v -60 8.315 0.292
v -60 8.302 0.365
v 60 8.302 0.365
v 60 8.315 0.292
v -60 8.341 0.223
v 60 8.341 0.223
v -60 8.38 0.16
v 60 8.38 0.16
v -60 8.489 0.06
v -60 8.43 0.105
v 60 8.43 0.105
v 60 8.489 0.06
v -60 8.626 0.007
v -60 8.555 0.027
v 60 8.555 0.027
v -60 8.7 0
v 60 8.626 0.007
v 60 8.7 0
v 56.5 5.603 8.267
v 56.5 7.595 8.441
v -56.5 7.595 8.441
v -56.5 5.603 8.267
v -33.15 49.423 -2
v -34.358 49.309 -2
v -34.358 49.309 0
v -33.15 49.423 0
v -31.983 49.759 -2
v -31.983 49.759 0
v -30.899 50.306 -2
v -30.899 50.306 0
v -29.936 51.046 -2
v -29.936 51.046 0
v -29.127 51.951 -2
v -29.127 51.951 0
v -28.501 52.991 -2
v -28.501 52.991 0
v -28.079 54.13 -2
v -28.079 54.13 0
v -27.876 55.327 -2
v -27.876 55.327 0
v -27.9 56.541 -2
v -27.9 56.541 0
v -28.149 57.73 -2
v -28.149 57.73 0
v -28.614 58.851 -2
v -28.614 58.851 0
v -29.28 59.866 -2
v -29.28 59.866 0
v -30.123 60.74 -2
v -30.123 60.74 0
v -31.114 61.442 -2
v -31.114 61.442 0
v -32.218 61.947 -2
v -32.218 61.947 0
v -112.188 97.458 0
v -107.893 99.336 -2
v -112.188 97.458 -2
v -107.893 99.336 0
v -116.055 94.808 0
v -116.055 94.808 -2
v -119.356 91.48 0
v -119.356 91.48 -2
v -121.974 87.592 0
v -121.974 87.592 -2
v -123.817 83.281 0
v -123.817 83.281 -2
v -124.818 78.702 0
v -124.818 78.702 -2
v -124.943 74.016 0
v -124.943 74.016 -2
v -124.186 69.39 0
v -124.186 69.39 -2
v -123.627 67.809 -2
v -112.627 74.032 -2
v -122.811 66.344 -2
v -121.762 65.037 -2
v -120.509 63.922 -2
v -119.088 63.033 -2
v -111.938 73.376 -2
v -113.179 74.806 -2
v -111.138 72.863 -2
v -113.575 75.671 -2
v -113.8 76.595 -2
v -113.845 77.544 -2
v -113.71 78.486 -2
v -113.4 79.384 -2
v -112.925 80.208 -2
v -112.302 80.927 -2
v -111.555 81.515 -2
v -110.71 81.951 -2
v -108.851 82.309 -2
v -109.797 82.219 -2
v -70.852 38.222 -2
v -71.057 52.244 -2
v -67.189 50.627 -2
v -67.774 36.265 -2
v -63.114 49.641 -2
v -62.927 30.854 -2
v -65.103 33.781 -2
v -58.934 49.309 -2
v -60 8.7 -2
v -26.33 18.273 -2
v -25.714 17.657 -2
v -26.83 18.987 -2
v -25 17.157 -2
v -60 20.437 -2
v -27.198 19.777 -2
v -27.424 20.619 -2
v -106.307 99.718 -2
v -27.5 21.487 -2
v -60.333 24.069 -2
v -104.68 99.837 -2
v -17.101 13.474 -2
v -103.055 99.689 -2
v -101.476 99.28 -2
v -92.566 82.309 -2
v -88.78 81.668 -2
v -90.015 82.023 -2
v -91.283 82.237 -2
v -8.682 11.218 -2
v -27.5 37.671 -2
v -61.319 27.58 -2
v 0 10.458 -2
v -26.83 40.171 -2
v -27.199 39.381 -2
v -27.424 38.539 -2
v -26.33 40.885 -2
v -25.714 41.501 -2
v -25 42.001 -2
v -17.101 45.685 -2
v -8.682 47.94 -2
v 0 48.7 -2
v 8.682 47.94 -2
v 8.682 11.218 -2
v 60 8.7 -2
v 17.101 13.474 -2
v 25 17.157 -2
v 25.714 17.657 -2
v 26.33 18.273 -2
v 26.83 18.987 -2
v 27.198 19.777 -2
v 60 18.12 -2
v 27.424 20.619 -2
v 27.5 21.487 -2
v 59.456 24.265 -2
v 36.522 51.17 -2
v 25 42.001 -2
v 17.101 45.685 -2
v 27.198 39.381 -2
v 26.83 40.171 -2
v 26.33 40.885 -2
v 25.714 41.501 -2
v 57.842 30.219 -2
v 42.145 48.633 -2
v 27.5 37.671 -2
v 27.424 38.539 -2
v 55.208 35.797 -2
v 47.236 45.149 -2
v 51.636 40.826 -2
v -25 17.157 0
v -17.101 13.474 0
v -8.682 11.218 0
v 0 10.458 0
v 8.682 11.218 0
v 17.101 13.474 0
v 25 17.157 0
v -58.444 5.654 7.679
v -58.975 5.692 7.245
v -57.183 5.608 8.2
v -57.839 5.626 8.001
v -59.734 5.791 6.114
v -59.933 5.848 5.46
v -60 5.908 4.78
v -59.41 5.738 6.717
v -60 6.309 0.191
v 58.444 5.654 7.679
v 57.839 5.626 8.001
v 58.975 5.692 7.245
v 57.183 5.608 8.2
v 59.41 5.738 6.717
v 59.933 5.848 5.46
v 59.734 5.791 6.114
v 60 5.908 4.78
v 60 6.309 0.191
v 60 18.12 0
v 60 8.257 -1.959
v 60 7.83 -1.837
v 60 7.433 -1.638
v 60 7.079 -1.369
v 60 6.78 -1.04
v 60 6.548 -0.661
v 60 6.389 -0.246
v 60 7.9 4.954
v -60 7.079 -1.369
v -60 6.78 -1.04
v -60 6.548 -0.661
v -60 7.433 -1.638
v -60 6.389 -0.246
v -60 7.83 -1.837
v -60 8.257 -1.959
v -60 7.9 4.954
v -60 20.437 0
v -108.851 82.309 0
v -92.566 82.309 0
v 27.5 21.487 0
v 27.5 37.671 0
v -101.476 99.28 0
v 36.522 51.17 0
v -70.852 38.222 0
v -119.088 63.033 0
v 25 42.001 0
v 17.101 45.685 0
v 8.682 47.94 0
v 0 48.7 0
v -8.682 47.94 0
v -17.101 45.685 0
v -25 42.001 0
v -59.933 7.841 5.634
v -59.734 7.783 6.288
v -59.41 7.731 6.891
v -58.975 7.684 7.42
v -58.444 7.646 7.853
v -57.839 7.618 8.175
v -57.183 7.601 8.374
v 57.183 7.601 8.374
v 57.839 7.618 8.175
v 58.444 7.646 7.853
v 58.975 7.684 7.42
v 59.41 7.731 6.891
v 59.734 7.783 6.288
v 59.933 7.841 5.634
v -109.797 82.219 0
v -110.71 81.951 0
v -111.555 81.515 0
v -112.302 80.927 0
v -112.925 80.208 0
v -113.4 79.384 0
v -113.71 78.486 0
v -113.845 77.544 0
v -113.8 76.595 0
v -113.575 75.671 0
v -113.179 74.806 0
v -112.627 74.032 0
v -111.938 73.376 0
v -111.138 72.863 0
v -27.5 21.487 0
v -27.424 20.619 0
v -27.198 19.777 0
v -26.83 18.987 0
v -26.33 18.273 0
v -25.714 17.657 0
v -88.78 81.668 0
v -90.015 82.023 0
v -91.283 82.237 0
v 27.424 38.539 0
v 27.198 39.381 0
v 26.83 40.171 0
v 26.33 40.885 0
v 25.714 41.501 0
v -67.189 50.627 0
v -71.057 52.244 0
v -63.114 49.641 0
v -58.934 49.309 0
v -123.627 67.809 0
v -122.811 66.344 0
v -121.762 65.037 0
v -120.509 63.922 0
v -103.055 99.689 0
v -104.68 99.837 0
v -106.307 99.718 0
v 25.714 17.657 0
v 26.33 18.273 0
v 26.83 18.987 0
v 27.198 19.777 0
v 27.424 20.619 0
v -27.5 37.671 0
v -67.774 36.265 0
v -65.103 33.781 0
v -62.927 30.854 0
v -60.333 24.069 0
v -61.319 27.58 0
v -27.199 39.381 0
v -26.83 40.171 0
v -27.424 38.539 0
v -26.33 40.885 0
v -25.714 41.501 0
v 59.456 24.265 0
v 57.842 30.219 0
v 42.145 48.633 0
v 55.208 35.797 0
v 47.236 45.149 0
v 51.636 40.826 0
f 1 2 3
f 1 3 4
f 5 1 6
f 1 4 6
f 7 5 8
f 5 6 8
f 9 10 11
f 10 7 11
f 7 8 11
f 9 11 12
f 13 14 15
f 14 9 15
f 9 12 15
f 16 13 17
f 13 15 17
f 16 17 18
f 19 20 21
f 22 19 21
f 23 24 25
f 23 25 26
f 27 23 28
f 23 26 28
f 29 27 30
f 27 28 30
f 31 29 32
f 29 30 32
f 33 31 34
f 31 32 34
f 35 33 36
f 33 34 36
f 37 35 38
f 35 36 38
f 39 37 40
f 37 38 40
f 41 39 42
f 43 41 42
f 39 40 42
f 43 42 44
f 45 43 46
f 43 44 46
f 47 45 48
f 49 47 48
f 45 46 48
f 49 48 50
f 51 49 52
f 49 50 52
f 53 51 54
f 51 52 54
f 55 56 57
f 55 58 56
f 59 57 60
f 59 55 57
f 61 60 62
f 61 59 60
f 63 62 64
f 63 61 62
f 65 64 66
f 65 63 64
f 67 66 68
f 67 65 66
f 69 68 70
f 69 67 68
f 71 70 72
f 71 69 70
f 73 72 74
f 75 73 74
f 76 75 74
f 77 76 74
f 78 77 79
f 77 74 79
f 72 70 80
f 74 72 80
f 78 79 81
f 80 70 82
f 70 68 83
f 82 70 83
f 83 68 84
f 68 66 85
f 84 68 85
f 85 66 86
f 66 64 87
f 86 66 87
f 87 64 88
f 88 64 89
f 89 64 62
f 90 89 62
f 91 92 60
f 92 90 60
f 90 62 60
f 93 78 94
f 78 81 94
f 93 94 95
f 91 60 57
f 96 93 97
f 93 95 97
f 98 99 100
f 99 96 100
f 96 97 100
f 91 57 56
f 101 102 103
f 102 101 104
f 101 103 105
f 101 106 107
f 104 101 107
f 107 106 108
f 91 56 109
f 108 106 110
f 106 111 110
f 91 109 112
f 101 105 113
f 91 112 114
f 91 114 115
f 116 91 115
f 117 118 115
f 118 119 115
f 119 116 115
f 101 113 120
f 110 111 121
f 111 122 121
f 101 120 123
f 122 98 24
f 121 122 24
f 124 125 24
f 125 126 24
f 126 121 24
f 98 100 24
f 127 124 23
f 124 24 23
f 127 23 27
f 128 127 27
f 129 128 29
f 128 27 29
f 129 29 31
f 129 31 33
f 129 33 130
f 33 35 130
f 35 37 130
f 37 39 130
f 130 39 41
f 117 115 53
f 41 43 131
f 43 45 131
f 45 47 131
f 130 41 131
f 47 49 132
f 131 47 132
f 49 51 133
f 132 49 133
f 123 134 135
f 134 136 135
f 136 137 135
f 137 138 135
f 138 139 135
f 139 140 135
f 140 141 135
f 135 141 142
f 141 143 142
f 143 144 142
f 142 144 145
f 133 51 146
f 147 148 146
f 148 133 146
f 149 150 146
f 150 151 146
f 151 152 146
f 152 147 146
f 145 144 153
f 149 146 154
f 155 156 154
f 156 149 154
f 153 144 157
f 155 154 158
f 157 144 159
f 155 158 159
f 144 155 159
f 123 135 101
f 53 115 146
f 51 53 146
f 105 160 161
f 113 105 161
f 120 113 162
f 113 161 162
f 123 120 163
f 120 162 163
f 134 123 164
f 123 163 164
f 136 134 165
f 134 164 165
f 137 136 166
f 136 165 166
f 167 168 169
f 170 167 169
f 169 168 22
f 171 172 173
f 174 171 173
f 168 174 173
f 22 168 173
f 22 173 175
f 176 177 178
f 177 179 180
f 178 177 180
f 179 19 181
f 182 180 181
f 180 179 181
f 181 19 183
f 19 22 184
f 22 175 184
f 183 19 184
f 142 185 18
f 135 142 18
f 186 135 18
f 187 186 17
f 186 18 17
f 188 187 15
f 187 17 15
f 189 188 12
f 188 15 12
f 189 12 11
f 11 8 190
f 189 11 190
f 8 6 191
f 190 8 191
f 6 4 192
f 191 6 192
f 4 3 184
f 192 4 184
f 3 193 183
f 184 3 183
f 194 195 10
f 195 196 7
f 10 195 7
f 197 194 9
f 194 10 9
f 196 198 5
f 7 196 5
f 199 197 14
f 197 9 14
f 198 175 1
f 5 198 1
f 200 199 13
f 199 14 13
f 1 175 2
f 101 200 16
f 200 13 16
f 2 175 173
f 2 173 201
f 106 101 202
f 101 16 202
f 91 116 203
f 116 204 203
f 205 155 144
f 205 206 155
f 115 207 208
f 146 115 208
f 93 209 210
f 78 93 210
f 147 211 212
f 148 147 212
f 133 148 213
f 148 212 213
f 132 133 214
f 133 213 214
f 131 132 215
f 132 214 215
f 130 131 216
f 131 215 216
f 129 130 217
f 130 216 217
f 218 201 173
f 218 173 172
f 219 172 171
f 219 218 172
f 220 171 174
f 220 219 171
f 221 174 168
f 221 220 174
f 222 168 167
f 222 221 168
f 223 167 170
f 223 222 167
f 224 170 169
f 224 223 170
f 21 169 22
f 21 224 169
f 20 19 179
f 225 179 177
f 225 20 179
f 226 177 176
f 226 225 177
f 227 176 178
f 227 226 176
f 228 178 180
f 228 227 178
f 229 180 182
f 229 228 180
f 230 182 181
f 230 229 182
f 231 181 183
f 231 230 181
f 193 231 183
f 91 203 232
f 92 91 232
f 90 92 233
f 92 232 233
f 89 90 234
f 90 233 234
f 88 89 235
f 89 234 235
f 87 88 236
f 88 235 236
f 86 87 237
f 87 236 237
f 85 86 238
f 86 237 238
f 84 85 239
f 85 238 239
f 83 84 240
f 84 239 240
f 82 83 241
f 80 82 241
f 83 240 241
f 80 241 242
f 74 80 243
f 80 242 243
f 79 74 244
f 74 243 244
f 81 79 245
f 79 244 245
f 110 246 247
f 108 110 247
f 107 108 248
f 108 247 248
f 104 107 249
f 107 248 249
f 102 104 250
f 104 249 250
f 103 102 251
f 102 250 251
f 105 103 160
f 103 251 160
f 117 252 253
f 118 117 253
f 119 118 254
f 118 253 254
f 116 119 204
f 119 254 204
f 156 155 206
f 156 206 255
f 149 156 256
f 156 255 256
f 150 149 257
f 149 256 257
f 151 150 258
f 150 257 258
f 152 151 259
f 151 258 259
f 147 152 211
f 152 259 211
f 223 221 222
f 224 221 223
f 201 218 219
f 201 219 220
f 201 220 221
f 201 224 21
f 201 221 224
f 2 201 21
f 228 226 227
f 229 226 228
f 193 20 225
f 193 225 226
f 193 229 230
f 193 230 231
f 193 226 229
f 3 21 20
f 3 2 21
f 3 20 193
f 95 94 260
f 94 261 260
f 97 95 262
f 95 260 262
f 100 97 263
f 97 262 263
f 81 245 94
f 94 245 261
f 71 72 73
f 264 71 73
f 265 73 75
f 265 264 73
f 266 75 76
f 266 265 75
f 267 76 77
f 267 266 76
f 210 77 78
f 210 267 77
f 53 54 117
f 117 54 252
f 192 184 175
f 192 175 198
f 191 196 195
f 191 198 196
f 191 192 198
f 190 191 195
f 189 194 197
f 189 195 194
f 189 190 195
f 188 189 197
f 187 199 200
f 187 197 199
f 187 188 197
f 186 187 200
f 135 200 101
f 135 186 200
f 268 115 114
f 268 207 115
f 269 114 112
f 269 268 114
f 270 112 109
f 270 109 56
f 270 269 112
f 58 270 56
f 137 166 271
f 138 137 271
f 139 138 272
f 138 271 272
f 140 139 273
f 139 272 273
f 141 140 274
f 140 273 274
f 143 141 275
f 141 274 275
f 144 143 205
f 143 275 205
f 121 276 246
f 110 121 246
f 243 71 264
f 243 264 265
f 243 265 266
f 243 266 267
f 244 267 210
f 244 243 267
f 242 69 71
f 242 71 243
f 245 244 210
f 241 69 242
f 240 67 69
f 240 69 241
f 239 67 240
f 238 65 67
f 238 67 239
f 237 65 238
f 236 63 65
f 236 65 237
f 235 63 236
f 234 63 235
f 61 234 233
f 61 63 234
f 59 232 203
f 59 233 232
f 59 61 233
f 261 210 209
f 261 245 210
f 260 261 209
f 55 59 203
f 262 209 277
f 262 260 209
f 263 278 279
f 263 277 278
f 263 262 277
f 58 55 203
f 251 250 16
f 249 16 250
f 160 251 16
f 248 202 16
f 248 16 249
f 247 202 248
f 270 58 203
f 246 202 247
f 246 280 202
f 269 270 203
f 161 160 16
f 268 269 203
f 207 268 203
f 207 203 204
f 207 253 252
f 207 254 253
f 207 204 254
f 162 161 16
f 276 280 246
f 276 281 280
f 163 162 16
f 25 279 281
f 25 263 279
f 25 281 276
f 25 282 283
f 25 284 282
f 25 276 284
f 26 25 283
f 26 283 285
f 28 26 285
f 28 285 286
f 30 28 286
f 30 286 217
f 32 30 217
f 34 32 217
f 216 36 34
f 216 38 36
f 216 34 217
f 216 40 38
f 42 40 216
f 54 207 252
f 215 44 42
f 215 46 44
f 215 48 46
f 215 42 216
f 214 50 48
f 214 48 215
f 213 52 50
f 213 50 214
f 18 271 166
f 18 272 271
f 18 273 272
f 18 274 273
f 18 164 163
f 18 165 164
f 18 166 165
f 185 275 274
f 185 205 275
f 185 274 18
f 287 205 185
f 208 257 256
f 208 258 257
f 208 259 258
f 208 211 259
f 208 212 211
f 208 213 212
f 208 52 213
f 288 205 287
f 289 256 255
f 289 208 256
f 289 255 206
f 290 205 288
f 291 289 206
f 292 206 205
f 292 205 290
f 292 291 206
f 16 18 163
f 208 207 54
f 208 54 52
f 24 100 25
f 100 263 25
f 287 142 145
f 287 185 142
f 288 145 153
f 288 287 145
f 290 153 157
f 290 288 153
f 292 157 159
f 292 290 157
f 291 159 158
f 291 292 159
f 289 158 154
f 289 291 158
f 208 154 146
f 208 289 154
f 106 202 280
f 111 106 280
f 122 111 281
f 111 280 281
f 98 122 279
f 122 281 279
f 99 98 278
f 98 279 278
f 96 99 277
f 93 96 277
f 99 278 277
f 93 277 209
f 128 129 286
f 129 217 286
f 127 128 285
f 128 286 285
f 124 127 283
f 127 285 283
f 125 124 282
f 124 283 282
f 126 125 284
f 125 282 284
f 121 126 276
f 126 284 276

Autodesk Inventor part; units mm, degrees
ref_plane "YZ Plane" through (0, 0, 0) normal (1, 0, 0) x (0, 1, 0)
ref_plane "XZ Plane" through (0, 0, 0) normal (0, 1, 0) x (-1, 0, 0)
ref_plane "XY Plane" through (0, 0, 0) normal (0, 0, 1) x (1, 0, 0)
sketch "草圖1" plane through (0, 0, 0) normal (0, 0, 1) x (1, 0, 0)
  line L0 (0, 0) -> (-40.5681, 0) construction
  line L1 (0, 0) -> (0, 45.2738) construction
  line L2 (-60, 18.7) -> (-21.9145, 18.7) construction
  line L3 (60, 18.1203) -> (60, 3.5)
  line L4 (56.5, 0) -> (-56.5, 0)
  line L5 (-60, 3.5) -> (-60, 18.7)
  line L6 (-87.6368, 8.7) -> (76.2221, 8.7)
  arc A0 (-60, 3.5) -> (-56.5, 0) centre (-56.5, 3.5) ccw
  arc A1 (56.5, 0) -> (60, 3.5) centre (56.5, 3.5) ccw
  arc A2 (-25, 17.157) -> (25, 17.157) centre (0, 60.4582) ccw
  line L7 (-27.5, 18.7) -> (27.5, 18.7) construction
  line L8 (16.8799, 18.7) -> (60, 18.7) construction
  line L9 (-60, 18.7) -> (-60, 20.4369)
  line L10 (-70.8518, 38.2221) -> (-119.0875, 63.0331)
  line L11 (-101.4762, 99.2795) -> (36.5219, 51.1695)
  arc A3 (-107.8929, 99.3362) -> (-124.1865, 69.3896) centre (-100.1179, 75.7) ccw
  line L12 (-104.2307, 100.2398) -> (-122.4731, 64.7746) construction
  line L13 (-92.566, 80.8091) -> (-108.8509, 80.8091)
  arc A4 (-89.2737, 80.2516) -> (-92.566, 80.8091) centre (-92.566, 70.8091) ccw
  line L14 (-32.7123, 60.5304) -> (-89.2737, 80.2516)
  arc A5 (-108.8509, 80.8091) -> (-110.452, 74.1968) centre (-108.8509, 77.3091) ccw
  line L15 (-110.452, 74.1968) -> (-70.3705, 53.5781)
  arc A6 (-70.3705, 53.5781) -> (-58.9345, 50.8091) centre (-58.9345, 75.8091) ccw
  line L16 (-58.9345, 50.8091) -> (-34.3585, 50.8091)
  arc A7 (-34.3585, 50.8091) -> (-32.7123, 60.5304) centre (-34.3585, 55.8091) ccw
  arc A8 (-88.7798, 81.668) -> (-92.566, 82.3091) centre (-92.566, 70.8091) ccw
  line L17 (-92.566, 82.3091) -> (-108.8509, 82.3091)
  arc A9 (-108.8509, 82.3091) -> (-111.1381, 72.8629) centre (-108.8509, 77.3091) ccw
  line L18 (-111.1381, 72.8629) -> (-71.0567, 52.2443)
  arc A10 (-71.0567, 52.2443) -> (-58.9345, 49.3091) centre (-58.9345, 75.8091) ccw
  line L19 (-58.9345, 49.3091) -> (-34.3585, 49.3091)
  arc A11 (-34.3585, 49.3091) -> (-32.2185, 61.9468) centre (-34.3585, 55.8091) ccw
  line L20 (-32.2185, 61.9468) -> (-88.7798, 81.668)
  arc A12 (-101.4762, 99.2795) -> (-107.8929, 99.3362) centre (-104.7682, 89.8369) ccw
  arc A13 (-124.1865, 69.3896) -> (-119.0875, 63.0331) centre (-114.5134, 71.9257) ccw
  arc A14 (25, 42.0013) -> (-25, 42.0013) centre (0, -1.3) ccw
  line L21 (-27.5, 37.6711) -> (-27.5, 21.4871)
  line L22 (27.5, 37.6711) -> (27.5, 21.4871)
  arc A15 (27.5, 37.6711) -> (25, 42.0013) centre (22.5, 37.6711) ccw
  arc A16 (25, 17.157) -> (27.5, 21.4871) centre (22.5, 21.4871) ccw
  arc A17 (-27.5, 21.4871) -> (-25, 17.157) centre (-22.5, 21.4871) ccw
  arc A18 (-25, 42.0013) -> (-27.5, 37.6711) centre (-22.5, 37.6711) ccw
  arc A19 (-60, 20.4369) -> (-70.8518, 38.2221) centre (-80, 20.4369) ccw
  arc A20 (60, 18.1203) -> (36.5219, 51.1695) centre (25, 18.1203) ccw
  point P0 (0, 0)
  point P1 (60, 42.9843)
  point P2 (-60, 40.3647)
  point P3 (-60, 32.6402)
  point P4 (27.5, 40.4582)
  point P5 (-27.5, 40.4582)
  point P6 (0, 18.7)
  dimension "d0" = 120
  dimension "d1" = 3.5
  dimension "d2" = 8.7
  dimension "d3" = 10
  dimension "d9" = 1.7582
  dimension "d12" = 117.22
  dimension "d14" = 8
  dimension "d16" = 24.8821
  dimension "d19" = 1.5
  dimension "d20" = 65
  dimension "d21" = 10
  dimension "d22" = 10
  dimension "d23" = 50
  dimension "d24" = 30
  dimension "d25" = 5
  dimension "d26" = 55
  dimension "d27" = 57
  dimension "d28" = 20
  dimension "d29" = 35
  dimension "d30" = 81.1369
extrude "擠出1" add sketch "草圖1" against normal blind 2 contours L3 L6 L5 L9 A19 L10 A13 A3 A12 L11 A20 | L3 A1 L4 A0 L5 L6
bend part "折彎零件1" radius 0.4 angle 85 line through (-87.6368, 8.7, 0) along (1, 0, 0) centre toward (0, 0, 1) moving side (0, -1, 0) both sides no
equation "\"折彎半徑\" = 厚度"
equation "\"折彎離隙寬度\" = 厚度"
equation "\"折彎離隙深度\" = 0.5 * 厚度"
equation "\"轉角離隙大小\" = 4 * 厚度"
equation "\"最小剩餘\" = 2 * 厚度"
equation "\"轉移半徑\" = 折彎半徑"
equation "\"Jacobi半徑大小\" = 折彎半徑"
equation "\"間隙大小\" = 厚度"
equation "\"厚度\" = 2"
properties part number "0 零件" material "不鏽鋼"
